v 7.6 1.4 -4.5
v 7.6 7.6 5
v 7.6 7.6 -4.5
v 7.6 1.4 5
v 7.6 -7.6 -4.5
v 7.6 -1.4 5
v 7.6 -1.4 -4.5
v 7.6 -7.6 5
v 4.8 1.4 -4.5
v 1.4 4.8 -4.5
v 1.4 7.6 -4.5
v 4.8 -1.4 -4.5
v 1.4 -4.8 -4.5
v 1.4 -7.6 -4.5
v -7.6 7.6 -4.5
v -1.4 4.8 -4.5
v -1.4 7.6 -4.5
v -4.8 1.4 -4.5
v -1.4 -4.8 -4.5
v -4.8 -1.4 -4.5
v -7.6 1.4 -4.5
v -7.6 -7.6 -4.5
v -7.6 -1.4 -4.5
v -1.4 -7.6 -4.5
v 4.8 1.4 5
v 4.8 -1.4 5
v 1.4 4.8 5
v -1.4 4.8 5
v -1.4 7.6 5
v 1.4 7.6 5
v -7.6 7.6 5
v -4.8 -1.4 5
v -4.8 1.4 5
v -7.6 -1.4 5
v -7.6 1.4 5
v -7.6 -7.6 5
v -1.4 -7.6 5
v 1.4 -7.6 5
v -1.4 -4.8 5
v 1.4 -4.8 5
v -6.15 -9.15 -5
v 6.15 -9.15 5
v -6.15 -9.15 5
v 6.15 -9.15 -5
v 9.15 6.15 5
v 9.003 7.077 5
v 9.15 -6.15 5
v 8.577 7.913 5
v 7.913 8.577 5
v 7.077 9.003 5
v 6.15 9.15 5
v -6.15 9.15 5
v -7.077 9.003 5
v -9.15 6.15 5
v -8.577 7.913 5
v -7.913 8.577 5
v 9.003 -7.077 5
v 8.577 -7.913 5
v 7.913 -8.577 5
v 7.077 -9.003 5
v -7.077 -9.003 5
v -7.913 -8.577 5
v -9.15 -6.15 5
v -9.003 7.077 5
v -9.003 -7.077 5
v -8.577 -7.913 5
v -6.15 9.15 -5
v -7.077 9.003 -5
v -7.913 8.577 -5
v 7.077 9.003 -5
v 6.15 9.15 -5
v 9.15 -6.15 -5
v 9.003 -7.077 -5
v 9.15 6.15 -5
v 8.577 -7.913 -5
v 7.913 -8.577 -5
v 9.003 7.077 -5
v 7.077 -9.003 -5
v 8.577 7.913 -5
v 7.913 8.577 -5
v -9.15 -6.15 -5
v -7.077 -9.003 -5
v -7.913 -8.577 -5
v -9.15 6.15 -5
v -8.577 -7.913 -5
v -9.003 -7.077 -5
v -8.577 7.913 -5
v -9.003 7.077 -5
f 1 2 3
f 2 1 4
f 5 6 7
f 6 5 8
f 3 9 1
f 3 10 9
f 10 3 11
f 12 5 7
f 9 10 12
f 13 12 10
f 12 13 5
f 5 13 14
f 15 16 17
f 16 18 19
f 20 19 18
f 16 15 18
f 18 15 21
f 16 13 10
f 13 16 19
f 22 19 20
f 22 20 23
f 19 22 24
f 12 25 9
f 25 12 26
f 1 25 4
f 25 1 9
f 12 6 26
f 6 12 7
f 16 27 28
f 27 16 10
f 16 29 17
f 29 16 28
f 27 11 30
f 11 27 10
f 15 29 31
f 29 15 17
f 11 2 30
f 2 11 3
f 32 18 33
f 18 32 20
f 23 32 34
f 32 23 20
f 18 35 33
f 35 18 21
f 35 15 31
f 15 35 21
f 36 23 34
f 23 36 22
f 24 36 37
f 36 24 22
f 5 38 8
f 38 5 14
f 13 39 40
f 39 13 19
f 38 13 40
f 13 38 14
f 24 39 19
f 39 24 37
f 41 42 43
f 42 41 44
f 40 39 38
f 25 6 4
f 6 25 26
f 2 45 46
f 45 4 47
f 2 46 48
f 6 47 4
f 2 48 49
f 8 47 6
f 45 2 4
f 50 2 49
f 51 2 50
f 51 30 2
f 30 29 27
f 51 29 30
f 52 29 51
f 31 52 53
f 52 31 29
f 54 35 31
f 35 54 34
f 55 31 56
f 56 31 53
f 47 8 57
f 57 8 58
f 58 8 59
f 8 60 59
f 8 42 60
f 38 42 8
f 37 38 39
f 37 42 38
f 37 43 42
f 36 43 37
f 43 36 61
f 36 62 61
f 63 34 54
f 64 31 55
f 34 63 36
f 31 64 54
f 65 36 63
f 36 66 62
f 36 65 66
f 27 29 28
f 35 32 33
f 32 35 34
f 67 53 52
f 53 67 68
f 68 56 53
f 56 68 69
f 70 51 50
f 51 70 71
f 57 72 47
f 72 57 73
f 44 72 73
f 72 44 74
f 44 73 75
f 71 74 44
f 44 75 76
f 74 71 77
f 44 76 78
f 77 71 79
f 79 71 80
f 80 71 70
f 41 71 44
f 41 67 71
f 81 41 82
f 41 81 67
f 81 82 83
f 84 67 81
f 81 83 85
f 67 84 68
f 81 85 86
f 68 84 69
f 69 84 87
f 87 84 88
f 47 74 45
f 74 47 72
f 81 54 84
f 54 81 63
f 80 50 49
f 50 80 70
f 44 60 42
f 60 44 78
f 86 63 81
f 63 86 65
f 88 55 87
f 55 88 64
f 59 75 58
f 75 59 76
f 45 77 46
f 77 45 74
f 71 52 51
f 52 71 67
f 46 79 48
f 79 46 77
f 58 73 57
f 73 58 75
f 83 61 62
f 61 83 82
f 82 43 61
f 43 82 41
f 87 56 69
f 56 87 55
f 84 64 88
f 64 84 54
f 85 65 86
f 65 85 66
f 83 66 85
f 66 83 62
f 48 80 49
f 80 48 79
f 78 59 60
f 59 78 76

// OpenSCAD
// Just a rough approximation to use for negative space!
module openbeam(size=15, length=15, slot=3) {
    difference() {
        cube([size, size, length], center=true);
        for(i=[0:3]) {
            rotate([0, 0, i*90])
            translate([(size-slot)/2, 0, 0])
            cube([slot, slot, length], center=true);
        }
    }
}

// XY Rounded Edge Cube
module roundedcube(dims, radius=1, $fn=20) {
    minkowski() {
        cube([dims[0]-2*radius, dims[1]-2*radius, dims[2]/2], center=true);
        cylinder(r=radius, h=dims[2]/2, center=true, $fn=$fn);
    }
}

module endcap() {
    difference() {
        roundedcube([18.3, 18.3, 10], radius=3);
        translate([0, 0, 3])
            openbeam(size=15.2, slot=2.8);
    }
}

endcap();
